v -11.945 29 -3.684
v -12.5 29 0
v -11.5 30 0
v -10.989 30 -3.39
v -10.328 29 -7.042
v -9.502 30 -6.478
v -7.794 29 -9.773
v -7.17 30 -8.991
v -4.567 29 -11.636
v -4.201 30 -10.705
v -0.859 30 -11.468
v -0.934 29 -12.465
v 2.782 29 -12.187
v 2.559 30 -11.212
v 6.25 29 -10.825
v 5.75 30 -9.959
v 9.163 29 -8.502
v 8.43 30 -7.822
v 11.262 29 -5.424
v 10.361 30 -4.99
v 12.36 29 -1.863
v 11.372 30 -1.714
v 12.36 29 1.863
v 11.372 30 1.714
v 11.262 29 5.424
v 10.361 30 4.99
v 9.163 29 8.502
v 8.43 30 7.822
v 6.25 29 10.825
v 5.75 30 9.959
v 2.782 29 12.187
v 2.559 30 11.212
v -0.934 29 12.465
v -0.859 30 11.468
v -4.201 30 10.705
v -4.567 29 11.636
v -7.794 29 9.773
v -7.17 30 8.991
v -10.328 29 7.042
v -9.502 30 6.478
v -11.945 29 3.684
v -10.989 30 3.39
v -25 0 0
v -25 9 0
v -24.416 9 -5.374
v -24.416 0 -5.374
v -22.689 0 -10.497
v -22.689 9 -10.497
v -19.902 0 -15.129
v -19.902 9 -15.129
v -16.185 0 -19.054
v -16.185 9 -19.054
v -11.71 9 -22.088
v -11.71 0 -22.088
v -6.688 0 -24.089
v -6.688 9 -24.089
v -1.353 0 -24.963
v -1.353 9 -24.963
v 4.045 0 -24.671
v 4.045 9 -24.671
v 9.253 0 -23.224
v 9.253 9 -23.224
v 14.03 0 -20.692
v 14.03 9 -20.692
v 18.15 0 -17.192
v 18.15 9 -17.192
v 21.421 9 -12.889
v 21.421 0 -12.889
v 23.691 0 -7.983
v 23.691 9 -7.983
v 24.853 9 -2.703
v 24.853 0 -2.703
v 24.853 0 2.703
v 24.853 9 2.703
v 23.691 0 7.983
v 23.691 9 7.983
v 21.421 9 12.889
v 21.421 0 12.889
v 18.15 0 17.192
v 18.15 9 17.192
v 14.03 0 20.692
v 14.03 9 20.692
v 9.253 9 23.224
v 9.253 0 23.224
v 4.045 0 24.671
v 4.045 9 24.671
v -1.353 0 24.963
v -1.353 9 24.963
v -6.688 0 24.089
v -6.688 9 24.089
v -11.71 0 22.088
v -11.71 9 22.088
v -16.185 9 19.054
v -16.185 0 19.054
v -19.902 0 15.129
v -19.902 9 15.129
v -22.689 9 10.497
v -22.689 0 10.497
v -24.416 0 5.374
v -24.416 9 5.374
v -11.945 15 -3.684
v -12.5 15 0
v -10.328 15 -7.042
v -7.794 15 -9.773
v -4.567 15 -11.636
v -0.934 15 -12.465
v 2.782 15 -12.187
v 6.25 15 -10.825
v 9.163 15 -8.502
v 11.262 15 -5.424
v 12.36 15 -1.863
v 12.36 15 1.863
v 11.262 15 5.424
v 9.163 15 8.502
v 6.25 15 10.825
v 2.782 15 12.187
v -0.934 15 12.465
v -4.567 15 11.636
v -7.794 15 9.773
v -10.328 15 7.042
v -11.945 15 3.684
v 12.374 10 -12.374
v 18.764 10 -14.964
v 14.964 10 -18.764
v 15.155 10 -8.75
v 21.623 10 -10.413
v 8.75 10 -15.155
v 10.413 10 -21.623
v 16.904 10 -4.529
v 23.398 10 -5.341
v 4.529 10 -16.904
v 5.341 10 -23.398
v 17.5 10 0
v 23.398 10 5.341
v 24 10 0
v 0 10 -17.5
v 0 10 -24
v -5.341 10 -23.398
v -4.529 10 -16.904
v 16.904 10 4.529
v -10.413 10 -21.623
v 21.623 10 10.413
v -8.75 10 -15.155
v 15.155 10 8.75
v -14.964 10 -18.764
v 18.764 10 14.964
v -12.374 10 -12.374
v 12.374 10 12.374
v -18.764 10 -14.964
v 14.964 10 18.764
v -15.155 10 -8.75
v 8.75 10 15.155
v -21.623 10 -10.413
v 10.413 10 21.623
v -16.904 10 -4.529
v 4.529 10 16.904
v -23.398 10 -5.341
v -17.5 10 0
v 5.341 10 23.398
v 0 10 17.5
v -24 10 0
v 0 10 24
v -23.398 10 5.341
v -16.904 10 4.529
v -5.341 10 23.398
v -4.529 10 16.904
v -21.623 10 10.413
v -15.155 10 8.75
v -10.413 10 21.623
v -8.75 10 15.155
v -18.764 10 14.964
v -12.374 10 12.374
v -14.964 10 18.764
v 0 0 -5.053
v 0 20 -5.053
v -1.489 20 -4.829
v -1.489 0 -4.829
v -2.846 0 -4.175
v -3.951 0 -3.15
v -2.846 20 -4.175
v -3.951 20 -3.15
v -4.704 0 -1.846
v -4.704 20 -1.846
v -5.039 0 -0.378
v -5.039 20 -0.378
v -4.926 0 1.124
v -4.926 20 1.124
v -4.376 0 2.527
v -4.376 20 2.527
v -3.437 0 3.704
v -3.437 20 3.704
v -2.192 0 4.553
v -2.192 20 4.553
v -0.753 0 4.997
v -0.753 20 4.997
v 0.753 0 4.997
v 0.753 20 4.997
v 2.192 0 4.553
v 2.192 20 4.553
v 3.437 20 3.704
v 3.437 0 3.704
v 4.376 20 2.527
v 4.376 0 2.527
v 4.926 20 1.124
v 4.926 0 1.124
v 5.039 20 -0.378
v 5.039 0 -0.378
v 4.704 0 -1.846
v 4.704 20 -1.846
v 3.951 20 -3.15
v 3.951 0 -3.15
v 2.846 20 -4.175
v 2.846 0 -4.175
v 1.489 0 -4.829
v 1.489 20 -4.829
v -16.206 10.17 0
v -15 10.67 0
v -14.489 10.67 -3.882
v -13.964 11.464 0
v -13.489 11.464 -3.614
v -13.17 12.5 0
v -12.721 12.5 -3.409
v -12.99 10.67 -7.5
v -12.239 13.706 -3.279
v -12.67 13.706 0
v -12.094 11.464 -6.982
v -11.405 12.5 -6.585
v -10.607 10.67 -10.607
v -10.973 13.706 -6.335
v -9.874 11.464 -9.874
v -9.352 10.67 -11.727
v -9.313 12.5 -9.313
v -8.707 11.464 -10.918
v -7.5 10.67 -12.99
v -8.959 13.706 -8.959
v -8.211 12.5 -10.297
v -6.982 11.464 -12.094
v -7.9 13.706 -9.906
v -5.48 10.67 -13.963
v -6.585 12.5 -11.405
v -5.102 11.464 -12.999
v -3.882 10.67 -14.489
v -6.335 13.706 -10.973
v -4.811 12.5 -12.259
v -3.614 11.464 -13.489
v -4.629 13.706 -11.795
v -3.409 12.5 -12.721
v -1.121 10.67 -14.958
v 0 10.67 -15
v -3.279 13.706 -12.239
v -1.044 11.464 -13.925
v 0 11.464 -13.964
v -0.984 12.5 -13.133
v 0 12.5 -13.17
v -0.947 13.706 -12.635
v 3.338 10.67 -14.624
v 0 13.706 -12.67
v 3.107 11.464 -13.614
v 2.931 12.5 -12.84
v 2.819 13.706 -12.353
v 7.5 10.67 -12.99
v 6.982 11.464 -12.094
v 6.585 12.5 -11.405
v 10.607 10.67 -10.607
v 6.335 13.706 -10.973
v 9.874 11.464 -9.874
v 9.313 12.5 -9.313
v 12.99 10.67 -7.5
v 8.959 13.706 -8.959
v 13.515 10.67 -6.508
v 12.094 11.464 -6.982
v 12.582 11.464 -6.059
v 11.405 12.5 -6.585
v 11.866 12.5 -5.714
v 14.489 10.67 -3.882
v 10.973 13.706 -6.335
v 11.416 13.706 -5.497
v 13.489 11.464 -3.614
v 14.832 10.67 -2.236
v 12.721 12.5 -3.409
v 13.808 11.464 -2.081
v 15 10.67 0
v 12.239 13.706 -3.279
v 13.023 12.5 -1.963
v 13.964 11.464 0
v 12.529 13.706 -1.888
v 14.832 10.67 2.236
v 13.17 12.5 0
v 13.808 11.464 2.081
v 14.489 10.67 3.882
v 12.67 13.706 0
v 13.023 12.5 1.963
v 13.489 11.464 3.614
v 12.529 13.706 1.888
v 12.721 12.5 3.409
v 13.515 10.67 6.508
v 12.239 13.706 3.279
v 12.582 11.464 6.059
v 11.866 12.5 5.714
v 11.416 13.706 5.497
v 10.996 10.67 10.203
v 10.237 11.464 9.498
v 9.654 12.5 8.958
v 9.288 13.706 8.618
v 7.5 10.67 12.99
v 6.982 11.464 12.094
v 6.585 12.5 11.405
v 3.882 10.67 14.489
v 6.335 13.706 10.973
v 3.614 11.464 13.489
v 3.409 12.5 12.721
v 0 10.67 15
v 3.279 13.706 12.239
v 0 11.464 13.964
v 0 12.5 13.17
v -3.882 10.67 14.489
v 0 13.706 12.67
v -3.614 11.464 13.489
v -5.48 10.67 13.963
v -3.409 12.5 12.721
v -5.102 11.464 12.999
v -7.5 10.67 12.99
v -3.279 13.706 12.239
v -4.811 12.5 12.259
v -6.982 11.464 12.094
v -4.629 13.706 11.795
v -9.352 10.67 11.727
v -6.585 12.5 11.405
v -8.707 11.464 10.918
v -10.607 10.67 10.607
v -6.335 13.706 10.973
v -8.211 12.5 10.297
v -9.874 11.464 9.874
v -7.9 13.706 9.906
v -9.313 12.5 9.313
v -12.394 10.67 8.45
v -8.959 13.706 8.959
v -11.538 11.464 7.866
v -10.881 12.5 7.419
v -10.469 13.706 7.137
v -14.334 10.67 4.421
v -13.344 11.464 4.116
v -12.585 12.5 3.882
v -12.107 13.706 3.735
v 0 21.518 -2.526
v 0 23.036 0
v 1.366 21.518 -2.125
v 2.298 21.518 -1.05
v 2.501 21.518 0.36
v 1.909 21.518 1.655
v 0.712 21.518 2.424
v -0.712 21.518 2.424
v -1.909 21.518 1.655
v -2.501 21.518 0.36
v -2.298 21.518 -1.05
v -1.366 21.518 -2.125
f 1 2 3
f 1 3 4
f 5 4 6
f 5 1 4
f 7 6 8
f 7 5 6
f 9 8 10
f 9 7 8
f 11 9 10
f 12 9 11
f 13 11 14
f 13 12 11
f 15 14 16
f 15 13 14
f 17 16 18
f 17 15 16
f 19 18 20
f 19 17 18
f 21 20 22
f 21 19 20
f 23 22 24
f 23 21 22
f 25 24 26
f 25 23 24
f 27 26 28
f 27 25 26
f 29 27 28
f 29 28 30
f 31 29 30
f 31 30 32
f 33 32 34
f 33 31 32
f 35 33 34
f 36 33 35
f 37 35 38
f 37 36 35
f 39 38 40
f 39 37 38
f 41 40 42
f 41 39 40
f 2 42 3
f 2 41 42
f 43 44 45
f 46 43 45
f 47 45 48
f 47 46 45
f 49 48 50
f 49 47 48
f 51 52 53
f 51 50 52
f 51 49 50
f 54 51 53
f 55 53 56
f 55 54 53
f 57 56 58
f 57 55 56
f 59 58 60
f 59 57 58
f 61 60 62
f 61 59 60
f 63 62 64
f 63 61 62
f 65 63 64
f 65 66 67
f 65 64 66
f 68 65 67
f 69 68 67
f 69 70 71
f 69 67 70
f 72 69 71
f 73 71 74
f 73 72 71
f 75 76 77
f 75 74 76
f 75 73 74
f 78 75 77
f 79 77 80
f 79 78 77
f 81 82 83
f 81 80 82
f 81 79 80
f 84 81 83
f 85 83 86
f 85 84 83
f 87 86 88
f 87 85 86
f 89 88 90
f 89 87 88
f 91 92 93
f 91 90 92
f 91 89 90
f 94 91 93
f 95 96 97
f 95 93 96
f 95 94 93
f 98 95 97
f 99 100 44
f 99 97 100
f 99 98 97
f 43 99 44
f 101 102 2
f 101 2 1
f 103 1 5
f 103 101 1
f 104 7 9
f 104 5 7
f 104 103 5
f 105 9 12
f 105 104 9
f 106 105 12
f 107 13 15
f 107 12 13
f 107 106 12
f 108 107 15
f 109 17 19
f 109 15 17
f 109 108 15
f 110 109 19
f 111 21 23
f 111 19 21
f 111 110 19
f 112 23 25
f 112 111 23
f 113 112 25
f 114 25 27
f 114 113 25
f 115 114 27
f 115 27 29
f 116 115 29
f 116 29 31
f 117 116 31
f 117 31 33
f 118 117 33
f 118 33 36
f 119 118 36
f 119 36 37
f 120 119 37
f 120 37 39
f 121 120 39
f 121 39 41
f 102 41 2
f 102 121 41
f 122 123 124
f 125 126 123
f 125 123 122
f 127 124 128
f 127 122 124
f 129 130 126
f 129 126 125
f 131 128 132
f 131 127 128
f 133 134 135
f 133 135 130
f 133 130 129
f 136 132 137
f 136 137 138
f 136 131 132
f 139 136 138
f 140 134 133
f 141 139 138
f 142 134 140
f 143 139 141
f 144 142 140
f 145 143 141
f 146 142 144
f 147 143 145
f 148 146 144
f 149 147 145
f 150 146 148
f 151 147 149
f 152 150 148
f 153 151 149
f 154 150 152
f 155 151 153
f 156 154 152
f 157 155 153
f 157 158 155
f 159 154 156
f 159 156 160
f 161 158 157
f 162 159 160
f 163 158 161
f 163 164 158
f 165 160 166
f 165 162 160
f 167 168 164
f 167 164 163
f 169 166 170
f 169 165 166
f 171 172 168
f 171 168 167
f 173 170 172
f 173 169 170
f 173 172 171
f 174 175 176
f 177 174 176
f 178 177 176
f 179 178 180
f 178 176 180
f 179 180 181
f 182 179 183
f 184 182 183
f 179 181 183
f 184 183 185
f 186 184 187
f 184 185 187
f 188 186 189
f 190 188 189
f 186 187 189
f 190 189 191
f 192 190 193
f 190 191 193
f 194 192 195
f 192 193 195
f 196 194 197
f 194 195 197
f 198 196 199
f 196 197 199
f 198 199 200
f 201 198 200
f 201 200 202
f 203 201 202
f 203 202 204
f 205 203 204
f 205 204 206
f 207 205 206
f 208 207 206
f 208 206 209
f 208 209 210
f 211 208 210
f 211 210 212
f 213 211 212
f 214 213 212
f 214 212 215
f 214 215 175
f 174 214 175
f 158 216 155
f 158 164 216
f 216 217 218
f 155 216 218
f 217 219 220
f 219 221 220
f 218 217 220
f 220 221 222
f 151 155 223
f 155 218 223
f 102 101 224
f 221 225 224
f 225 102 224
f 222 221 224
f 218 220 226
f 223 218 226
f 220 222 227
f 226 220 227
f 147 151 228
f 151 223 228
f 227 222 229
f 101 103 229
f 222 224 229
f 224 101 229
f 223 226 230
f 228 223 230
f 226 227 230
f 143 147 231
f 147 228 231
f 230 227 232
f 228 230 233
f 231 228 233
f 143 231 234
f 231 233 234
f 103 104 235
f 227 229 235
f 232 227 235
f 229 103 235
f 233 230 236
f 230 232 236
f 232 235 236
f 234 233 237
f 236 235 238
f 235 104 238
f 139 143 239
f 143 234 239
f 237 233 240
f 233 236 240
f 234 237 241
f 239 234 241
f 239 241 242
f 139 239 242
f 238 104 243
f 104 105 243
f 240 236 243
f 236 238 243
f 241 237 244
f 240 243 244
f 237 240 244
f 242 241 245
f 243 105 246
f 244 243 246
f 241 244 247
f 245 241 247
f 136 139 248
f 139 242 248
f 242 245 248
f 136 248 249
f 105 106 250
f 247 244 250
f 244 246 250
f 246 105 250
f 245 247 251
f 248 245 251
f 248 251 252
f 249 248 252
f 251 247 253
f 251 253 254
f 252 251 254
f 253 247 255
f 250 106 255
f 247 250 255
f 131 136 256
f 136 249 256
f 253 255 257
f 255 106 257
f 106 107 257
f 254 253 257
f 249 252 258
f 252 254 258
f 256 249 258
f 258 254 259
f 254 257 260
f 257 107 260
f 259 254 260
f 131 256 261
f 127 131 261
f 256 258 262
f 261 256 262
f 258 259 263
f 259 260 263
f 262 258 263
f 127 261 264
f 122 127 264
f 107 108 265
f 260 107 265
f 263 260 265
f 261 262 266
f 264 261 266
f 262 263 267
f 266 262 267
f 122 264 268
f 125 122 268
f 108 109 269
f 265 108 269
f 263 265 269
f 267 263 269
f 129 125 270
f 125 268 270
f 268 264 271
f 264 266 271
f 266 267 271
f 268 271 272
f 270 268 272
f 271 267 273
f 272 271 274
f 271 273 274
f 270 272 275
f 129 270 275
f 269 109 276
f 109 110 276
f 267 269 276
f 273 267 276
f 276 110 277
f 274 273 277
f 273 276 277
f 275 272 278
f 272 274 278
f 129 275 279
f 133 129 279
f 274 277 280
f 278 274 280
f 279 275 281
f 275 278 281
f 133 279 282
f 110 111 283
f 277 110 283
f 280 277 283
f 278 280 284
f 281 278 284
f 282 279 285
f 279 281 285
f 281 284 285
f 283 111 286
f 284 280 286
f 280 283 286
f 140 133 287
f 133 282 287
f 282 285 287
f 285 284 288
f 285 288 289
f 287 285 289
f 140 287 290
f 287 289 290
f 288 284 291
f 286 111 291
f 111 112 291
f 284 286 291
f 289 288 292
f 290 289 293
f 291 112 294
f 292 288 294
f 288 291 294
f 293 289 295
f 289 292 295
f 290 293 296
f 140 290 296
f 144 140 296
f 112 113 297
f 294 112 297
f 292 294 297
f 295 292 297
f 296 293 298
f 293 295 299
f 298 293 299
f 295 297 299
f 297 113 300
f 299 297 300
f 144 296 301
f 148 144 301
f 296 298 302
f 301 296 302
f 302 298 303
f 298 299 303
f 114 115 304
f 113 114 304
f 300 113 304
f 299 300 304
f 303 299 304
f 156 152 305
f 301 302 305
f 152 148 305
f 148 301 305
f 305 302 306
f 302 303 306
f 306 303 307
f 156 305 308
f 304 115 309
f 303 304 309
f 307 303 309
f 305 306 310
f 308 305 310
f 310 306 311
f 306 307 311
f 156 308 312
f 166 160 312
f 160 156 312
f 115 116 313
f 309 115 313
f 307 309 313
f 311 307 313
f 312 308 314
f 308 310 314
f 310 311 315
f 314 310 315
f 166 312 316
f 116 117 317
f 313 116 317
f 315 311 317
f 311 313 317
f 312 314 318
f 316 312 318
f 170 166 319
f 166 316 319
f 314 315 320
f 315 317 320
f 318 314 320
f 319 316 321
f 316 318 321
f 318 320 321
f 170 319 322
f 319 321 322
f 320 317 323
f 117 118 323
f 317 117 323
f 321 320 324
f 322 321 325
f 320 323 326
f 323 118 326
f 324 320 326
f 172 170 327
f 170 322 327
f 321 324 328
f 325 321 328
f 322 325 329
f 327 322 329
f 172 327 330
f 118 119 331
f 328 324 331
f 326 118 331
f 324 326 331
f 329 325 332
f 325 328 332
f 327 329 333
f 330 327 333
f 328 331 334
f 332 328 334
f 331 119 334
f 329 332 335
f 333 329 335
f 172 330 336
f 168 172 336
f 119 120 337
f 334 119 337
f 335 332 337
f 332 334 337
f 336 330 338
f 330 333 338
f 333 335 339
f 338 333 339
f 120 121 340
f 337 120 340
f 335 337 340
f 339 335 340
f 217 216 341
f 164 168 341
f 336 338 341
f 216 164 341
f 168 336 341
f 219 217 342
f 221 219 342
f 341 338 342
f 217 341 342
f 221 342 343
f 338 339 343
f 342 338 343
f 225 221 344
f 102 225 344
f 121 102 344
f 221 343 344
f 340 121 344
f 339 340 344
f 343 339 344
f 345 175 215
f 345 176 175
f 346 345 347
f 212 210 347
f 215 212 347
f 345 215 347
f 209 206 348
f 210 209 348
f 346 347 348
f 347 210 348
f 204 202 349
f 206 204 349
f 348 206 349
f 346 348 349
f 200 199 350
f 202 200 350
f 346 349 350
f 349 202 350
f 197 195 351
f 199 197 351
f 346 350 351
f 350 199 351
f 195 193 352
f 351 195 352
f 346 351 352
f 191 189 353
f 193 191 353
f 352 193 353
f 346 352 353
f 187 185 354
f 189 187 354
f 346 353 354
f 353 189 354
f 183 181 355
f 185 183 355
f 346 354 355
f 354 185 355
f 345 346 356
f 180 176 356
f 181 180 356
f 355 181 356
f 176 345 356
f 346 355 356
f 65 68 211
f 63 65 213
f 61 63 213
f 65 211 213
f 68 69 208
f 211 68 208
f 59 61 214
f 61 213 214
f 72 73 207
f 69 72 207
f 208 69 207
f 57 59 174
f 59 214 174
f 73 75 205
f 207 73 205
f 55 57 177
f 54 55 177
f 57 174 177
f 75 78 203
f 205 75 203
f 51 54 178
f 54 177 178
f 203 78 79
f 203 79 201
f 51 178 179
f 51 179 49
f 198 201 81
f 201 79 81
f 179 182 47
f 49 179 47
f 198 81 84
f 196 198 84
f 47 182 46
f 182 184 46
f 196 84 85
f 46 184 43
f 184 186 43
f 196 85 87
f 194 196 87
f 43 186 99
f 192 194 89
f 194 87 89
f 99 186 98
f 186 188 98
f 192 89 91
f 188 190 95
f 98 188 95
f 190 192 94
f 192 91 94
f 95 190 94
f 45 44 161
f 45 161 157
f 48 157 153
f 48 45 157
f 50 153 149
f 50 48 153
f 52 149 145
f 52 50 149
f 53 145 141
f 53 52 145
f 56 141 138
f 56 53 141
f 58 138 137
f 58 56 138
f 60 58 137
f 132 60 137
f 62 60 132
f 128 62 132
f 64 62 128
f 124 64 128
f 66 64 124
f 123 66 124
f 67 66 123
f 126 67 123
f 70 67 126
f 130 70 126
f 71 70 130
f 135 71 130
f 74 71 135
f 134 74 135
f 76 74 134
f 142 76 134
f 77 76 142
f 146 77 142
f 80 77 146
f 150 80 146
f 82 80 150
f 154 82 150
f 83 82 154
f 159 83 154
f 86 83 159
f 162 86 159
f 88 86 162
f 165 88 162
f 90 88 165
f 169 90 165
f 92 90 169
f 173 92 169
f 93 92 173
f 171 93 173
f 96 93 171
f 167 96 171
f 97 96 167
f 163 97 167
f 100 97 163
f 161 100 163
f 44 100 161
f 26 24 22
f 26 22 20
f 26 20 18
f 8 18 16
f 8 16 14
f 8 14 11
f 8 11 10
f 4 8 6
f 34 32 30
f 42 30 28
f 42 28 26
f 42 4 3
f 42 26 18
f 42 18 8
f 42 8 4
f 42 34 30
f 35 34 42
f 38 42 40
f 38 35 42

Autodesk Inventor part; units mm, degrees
ref_plane "YZ Plane" through (0, 0, 0) normal (1, 0, 0) x (0, 1, 0)
ref_plane "XZ Plane" through (0, 0, 0) normal (0, 1, 0) x (-1, 0, 0)
ref_plane "XY Plane" through (0, 0, 0) normal (0, 0, 1) x (1, 0, 0)
sketch "Szkic1" plane through (0, 0, 0) normal (0, 0, 1) x (1, 0, 0)
  line L0 (0, 0) -> (0, 30)
  line L1 (0, 30) -> (-12.5, 30)
  line L2 (-12.5, 30) -> (-12.5, 10)
  line L3 (-12.5, 10) -> (-25, 10)
  line L4 (-25, 10) -> (-25, 0)
  line L5 (-25, 0) -> (0, 0)
revolve "Obrót1" add sketch "Szkic1" angle 360 about axis through (0, 0, 0) along (0, 1, 0)
fillet "Zaokrąglenie1" radius 5 1 edges at (12.5, 10, 0)
chamfer "Faza1" distance 1 angle 45 2 edges at (12.5, 30, 0) (25, 10, 0)
sketch "Szkic2" plane through (0, 0, 0) normal (0, -1, 0) x (1, 0, 0)
  point P0 (0, 0)
hole "Otwór1" at (0, 0, 0) direction (0, 1, 0) diameter 10.106 depth 20 tip angle 118 thread size "M12x1.75" class "6H" standard "ISO Metric profile"
properties part number "Projekt elementy" material "Stal"
